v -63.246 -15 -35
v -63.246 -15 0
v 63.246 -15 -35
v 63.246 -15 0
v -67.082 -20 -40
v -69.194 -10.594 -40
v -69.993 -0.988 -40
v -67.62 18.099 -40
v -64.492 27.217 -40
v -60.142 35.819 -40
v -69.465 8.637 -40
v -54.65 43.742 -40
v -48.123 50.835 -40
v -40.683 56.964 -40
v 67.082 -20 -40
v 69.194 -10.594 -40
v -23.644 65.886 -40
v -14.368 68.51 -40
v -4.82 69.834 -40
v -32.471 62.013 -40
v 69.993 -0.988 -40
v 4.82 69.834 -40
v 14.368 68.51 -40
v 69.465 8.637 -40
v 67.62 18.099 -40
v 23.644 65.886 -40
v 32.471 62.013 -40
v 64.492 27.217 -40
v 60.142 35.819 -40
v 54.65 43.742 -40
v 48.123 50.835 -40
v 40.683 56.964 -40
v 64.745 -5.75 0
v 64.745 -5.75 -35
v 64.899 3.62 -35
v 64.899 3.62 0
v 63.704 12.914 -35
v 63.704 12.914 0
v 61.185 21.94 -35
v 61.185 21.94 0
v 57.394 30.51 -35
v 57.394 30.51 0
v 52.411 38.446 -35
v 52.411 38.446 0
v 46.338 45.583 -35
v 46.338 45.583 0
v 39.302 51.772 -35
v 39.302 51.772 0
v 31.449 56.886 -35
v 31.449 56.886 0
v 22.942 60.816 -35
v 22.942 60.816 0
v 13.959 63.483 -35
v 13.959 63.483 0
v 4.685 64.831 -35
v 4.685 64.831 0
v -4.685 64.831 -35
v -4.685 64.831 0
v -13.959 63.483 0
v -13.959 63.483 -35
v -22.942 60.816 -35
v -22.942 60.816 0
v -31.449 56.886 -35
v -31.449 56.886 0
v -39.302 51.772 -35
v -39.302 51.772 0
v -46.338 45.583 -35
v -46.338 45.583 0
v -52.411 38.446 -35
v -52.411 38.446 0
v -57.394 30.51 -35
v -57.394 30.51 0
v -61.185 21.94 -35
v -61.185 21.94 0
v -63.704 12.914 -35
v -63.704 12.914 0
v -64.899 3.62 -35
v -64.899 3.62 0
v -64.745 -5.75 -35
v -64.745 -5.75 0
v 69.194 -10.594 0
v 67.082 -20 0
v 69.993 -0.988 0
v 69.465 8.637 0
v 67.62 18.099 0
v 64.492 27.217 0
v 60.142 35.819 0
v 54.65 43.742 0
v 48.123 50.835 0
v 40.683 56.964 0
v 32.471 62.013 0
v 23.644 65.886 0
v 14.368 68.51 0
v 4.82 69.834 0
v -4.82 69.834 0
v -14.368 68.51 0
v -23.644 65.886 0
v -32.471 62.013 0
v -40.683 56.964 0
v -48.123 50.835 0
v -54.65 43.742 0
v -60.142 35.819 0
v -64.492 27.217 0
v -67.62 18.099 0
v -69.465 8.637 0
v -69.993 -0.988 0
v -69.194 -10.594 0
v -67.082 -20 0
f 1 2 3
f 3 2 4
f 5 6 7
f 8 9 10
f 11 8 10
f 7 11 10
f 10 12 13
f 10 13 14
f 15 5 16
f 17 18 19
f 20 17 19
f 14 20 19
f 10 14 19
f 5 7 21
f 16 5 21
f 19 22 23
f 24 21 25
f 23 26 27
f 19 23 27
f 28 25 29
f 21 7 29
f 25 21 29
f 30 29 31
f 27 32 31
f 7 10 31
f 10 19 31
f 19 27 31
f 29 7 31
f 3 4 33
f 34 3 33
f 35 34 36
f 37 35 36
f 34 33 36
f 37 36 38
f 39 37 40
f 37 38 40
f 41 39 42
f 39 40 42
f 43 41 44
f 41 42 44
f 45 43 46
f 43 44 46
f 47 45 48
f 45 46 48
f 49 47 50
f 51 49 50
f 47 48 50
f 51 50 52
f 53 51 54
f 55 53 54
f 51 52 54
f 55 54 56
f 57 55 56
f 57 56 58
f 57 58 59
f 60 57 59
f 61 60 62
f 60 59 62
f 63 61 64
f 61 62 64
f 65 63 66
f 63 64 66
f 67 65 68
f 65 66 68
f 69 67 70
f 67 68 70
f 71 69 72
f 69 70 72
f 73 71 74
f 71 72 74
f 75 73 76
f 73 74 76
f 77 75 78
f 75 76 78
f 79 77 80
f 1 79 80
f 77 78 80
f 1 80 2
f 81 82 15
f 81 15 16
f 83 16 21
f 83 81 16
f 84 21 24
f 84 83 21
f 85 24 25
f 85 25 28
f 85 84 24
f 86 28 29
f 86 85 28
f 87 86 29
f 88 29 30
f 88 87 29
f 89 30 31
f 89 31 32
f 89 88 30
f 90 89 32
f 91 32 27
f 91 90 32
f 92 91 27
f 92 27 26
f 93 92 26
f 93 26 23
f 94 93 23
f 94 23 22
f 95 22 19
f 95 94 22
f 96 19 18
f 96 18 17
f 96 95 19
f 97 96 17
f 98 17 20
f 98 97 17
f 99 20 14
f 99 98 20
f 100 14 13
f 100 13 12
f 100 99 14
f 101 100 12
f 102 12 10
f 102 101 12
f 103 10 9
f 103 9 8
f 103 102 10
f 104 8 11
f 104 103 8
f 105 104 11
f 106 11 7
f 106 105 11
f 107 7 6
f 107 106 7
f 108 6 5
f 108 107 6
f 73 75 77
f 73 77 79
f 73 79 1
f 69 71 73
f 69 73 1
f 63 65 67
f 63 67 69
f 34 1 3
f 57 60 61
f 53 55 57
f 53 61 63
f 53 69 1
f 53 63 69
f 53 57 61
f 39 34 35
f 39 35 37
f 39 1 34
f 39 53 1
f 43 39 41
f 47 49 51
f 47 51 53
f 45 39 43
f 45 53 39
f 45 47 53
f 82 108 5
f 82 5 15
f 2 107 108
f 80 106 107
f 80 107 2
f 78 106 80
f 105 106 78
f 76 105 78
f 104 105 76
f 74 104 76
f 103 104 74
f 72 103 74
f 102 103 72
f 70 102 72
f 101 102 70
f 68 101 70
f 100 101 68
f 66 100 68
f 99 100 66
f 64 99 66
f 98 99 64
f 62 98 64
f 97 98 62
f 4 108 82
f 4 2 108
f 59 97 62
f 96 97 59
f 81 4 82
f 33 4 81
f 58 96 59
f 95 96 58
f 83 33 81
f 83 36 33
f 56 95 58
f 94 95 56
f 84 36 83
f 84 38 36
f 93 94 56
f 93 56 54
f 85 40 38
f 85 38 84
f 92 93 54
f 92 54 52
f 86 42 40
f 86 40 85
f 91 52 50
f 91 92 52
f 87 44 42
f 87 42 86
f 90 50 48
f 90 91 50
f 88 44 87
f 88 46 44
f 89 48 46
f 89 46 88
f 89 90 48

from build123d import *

# Parameters (mm, degrees)
F1_DEPTH = 40
F3_DEPTH = 35


with BuildPart() as f1:
    # F0 (on Top) → F1 (new body)
    with BuildSketch(Plane.XY):
        with BuildLine():
            Line((-67.082039, -20), (67.082039, -20))
            ThreePointArc((67.082039, -20), (0, 70), (-67.082039, -20))
        make_face()
    extrude(amount=-F1_DEPTH)

    # F2 (on face) → F3 (cut)
    with BuildSketch(Plane.XY):
        with BuildLine():
            Line((-63.245553, -15), (63.245553, -15))
            ThreePointArc((63.245553, -15), (0, 65), (-63.245553, -15))
        make_face()
    extrude(amount=-F3_DEPTH, mode=Mode.SUBTRACT)


solid = f1.part
